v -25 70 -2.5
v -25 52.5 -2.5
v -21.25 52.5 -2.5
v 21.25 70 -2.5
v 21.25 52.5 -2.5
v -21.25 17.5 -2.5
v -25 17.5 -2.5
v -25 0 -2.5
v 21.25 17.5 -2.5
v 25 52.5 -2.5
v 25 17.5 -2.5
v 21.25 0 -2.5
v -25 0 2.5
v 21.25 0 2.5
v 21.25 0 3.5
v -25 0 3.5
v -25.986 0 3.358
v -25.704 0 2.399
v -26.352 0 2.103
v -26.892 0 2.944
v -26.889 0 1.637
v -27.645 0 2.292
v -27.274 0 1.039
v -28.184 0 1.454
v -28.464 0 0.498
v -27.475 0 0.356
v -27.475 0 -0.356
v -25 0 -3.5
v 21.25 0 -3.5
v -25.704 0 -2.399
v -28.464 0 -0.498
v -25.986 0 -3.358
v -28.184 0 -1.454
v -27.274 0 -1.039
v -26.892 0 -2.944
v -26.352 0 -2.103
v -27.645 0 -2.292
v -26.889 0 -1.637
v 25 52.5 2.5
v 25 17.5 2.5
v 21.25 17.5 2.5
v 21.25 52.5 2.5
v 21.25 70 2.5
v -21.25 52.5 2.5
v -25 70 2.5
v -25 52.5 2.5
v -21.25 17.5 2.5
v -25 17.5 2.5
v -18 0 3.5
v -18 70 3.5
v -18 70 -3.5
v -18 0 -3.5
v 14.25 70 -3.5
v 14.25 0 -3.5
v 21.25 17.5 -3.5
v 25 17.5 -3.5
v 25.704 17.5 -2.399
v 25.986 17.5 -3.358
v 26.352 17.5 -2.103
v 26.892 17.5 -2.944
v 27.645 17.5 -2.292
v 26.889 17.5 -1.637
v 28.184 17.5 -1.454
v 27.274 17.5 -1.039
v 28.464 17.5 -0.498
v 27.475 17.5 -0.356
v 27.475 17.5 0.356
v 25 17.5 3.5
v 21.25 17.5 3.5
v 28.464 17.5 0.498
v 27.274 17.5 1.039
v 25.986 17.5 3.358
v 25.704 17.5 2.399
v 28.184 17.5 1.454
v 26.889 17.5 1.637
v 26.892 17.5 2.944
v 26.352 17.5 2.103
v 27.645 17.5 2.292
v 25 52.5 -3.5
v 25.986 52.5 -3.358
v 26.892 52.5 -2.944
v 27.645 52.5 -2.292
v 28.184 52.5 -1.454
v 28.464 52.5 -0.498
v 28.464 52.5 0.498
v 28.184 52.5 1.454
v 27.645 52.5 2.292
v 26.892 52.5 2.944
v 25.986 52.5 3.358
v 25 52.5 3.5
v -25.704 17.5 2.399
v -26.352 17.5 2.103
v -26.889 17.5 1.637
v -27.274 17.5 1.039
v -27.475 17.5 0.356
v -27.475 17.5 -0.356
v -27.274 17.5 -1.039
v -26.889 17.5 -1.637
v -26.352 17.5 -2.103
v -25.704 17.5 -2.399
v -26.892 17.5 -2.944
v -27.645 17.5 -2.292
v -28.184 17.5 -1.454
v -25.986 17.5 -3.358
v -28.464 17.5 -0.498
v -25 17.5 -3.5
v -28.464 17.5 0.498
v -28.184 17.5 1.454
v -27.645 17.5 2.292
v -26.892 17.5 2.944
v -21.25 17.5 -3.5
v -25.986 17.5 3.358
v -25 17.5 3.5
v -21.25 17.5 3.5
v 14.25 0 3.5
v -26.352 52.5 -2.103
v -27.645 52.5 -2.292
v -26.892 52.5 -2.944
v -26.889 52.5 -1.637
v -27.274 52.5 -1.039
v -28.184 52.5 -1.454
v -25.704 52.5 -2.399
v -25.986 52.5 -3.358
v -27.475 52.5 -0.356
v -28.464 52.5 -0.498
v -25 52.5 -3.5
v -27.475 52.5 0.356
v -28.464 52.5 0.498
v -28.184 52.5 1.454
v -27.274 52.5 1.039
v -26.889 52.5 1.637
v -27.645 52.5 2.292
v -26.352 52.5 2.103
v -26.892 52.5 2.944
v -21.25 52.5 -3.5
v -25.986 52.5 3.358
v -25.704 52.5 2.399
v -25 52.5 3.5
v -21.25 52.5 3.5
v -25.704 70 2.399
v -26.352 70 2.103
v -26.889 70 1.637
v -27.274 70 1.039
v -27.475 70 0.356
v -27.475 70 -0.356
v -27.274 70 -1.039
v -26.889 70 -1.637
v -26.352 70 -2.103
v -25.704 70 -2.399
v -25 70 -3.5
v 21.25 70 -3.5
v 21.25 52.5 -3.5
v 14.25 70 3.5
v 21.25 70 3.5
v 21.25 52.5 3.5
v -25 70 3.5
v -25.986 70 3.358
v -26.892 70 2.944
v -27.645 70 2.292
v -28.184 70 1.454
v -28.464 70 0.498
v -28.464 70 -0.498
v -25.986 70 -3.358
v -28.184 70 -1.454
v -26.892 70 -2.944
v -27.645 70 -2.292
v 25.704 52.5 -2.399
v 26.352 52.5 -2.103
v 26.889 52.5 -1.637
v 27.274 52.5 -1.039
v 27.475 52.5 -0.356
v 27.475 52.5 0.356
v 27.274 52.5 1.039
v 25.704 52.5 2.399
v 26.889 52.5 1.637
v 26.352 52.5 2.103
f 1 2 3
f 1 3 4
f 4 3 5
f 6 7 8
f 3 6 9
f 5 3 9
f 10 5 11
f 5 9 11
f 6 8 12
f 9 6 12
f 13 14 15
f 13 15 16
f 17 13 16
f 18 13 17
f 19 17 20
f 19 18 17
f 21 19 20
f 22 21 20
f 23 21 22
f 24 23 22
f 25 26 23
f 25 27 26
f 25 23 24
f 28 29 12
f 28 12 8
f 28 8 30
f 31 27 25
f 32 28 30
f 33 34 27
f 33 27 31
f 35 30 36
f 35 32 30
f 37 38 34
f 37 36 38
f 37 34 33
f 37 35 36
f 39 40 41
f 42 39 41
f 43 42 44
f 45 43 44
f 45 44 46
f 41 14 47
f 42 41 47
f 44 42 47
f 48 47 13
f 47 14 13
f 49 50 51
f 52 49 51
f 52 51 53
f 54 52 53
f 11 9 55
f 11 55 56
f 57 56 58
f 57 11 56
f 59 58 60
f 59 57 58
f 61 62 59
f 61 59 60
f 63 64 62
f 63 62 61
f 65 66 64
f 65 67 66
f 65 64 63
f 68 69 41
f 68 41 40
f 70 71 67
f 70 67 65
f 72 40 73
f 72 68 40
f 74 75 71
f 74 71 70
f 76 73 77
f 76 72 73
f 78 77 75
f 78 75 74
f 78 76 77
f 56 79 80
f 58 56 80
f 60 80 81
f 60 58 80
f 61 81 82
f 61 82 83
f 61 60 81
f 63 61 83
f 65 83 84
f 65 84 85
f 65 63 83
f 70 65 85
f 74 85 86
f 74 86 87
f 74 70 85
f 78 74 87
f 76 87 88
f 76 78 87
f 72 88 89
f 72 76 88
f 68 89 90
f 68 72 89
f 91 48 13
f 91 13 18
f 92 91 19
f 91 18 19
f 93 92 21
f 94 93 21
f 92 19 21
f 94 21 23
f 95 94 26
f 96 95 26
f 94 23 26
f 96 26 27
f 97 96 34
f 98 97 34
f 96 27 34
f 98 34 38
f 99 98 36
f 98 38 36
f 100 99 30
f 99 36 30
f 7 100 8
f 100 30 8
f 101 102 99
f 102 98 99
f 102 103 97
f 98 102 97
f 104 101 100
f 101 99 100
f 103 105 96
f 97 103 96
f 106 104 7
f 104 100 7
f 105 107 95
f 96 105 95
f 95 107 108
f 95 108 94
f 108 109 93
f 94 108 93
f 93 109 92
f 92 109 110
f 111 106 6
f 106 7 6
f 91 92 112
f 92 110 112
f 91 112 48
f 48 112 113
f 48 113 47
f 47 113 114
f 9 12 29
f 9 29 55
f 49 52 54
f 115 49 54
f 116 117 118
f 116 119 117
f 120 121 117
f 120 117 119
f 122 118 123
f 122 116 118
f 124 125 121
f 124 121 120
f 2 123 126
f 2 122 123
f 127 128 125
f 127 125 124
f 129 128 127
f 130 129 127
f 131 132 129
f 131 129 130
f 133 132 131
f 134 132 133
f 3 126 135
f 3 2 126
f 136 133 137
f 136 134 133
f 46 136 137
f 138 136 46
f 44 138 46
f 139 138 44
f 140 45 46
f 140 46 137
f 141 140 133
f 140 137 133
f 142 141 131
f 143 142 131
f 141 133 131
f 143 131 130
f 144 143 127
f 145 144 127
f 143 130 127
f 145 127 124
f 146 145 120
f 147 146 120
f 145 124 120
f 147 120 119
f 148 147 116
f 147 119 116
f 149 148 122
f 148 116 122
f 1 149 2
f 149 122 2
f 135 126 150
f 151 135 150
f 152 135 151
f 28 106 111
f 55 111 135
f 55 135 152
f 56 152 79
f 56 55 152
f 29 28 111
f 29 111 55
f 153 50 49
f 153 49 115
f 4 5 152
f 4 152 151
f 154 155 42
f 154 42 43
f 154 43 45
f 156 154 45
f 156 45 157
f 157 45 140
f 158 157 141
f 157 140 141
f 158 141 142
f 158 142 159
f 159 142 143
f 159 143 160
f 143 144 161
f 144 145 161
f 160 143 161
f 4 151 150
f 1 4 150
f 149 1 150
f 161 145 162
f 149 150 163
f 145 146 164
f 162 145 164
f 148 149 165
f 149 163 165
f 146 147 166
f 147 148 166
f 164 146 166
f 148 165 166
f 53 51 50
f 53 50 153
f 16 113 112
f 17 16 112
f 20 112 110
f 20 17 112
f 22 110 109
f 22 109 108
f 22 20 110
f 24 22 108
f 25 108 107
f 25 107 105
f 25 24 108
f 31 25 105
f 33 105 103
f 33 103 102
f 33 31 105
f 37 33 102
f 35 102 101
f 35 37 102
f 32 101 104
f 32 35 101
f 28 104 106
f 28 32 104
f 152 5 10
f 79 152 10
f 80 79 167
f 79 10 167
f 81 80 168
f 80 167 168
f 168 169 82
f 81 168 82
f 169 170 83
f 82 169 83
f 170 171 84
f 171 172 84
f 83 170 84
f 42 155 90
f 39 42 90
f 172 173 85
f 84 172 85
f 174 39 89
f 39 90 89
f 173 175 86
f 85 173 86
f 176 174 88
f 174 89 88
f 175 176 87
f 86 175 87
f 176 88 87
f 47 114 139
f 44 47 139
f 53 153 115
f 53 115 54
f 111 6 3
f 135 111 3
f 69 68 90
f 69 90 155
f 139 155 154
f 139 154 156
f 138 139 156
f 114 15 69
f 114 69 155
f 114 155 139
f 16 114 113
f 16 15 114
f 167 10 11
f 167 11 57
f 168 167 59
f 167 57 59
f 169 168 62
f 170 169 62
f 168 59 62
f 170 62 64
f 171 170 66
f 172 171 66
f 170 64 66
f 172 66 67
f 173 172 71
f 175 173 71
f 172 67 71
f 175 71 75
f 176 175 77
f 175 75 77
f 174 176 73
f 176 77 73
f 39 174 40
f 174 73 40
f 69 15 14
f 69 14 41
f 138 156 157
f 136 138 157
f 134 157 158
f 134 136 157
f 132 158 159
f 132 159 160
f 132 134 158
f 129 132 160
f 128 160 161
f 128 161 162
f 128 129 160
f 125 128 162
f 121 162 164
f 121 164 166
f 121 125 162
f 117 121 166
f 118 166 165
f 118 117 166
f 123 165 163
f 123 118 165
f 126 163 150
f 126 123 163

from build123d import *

# Parameters (mm, degrees)
BOSS_EXTRUDE1_DEPTH = 70
SKETCH2_W           = 7.5
SKETCH2_H           = 17.5
SKETCH2_H_2         = 35
CUT_EXTRUDE1_DEPTH  = 7
SKETCH3_W           = 32.25
SKETCH3_H           = 7
BOSS_EXTRUDE2_DEPTH = 70


with BuildPart() as part:
    # Sketch1 → Boss-Extrude1 (new body)
    with BuildSketch(Plane(origin=(0, 0, 0), x_dir=(1, 0, 0), z_dir=(0, 1, 0))):
        with BuildLine():
            Line((-25, 3.5), (25, 3.5))
            ThreePointArc((25, 3.5), (28.5, 0), (25, -3.5))
            Line((25, -3.5), (-25, -3.5))
            ThreePointArc((-25, -3.5), (-28.5, 0), (-25, 3.5))
        make_face()
        with BuildLine():
            Line((-25, 2.5), (25, 2.5))
            ThreePointArc((25, 2.5), (27.5, 0), (25, -2.5))
            Line((25, -2.5), (-25, -2.5))
            ThreePointArc((-25, -2.5), (-27.5, 0), (-25, 2.5))
        make_face(mode=Mode.SUBTRACT)
    extrude(amount=BOSS_EXTRUDE1_DEPTH)

    # Sketch2 → Cut-Extrude1 (cut)
    with BuildSketch(Plane.XY.offset(3.5)):
        with Locations((25, 61.25)):
            Rectangle(SKETCH2_W, SKETCH2_H)
        with Locations((-25, 35)):
            Rectangle(SKETCH2_W, SKETCH2_H_2)
        with Locations((25, 8.75)):
            Rectangle(SKETCH2_W, SKETCH2_H)
    extrude(amount=-CUT_EXTRUDE1_DEPTH, mode=Mode.SUBTRACT)


with BuildPart() as body_2:
    # Sketch3 → Boss-Extrude2 (new body)
    with BuildSketch(Plane(origin=(0, 70, 0), x_dir=(1, 0, 0), z_dir=(0, 1, 0))):
        with Locations((-1.875, 0)):
            Rectangle(SKETCH3_W, SKETCH3_H)
    extrude(amount=-BOSS_EXTRUDE2_DEPTH)


solid = Compound([part.part, body_2.part])
